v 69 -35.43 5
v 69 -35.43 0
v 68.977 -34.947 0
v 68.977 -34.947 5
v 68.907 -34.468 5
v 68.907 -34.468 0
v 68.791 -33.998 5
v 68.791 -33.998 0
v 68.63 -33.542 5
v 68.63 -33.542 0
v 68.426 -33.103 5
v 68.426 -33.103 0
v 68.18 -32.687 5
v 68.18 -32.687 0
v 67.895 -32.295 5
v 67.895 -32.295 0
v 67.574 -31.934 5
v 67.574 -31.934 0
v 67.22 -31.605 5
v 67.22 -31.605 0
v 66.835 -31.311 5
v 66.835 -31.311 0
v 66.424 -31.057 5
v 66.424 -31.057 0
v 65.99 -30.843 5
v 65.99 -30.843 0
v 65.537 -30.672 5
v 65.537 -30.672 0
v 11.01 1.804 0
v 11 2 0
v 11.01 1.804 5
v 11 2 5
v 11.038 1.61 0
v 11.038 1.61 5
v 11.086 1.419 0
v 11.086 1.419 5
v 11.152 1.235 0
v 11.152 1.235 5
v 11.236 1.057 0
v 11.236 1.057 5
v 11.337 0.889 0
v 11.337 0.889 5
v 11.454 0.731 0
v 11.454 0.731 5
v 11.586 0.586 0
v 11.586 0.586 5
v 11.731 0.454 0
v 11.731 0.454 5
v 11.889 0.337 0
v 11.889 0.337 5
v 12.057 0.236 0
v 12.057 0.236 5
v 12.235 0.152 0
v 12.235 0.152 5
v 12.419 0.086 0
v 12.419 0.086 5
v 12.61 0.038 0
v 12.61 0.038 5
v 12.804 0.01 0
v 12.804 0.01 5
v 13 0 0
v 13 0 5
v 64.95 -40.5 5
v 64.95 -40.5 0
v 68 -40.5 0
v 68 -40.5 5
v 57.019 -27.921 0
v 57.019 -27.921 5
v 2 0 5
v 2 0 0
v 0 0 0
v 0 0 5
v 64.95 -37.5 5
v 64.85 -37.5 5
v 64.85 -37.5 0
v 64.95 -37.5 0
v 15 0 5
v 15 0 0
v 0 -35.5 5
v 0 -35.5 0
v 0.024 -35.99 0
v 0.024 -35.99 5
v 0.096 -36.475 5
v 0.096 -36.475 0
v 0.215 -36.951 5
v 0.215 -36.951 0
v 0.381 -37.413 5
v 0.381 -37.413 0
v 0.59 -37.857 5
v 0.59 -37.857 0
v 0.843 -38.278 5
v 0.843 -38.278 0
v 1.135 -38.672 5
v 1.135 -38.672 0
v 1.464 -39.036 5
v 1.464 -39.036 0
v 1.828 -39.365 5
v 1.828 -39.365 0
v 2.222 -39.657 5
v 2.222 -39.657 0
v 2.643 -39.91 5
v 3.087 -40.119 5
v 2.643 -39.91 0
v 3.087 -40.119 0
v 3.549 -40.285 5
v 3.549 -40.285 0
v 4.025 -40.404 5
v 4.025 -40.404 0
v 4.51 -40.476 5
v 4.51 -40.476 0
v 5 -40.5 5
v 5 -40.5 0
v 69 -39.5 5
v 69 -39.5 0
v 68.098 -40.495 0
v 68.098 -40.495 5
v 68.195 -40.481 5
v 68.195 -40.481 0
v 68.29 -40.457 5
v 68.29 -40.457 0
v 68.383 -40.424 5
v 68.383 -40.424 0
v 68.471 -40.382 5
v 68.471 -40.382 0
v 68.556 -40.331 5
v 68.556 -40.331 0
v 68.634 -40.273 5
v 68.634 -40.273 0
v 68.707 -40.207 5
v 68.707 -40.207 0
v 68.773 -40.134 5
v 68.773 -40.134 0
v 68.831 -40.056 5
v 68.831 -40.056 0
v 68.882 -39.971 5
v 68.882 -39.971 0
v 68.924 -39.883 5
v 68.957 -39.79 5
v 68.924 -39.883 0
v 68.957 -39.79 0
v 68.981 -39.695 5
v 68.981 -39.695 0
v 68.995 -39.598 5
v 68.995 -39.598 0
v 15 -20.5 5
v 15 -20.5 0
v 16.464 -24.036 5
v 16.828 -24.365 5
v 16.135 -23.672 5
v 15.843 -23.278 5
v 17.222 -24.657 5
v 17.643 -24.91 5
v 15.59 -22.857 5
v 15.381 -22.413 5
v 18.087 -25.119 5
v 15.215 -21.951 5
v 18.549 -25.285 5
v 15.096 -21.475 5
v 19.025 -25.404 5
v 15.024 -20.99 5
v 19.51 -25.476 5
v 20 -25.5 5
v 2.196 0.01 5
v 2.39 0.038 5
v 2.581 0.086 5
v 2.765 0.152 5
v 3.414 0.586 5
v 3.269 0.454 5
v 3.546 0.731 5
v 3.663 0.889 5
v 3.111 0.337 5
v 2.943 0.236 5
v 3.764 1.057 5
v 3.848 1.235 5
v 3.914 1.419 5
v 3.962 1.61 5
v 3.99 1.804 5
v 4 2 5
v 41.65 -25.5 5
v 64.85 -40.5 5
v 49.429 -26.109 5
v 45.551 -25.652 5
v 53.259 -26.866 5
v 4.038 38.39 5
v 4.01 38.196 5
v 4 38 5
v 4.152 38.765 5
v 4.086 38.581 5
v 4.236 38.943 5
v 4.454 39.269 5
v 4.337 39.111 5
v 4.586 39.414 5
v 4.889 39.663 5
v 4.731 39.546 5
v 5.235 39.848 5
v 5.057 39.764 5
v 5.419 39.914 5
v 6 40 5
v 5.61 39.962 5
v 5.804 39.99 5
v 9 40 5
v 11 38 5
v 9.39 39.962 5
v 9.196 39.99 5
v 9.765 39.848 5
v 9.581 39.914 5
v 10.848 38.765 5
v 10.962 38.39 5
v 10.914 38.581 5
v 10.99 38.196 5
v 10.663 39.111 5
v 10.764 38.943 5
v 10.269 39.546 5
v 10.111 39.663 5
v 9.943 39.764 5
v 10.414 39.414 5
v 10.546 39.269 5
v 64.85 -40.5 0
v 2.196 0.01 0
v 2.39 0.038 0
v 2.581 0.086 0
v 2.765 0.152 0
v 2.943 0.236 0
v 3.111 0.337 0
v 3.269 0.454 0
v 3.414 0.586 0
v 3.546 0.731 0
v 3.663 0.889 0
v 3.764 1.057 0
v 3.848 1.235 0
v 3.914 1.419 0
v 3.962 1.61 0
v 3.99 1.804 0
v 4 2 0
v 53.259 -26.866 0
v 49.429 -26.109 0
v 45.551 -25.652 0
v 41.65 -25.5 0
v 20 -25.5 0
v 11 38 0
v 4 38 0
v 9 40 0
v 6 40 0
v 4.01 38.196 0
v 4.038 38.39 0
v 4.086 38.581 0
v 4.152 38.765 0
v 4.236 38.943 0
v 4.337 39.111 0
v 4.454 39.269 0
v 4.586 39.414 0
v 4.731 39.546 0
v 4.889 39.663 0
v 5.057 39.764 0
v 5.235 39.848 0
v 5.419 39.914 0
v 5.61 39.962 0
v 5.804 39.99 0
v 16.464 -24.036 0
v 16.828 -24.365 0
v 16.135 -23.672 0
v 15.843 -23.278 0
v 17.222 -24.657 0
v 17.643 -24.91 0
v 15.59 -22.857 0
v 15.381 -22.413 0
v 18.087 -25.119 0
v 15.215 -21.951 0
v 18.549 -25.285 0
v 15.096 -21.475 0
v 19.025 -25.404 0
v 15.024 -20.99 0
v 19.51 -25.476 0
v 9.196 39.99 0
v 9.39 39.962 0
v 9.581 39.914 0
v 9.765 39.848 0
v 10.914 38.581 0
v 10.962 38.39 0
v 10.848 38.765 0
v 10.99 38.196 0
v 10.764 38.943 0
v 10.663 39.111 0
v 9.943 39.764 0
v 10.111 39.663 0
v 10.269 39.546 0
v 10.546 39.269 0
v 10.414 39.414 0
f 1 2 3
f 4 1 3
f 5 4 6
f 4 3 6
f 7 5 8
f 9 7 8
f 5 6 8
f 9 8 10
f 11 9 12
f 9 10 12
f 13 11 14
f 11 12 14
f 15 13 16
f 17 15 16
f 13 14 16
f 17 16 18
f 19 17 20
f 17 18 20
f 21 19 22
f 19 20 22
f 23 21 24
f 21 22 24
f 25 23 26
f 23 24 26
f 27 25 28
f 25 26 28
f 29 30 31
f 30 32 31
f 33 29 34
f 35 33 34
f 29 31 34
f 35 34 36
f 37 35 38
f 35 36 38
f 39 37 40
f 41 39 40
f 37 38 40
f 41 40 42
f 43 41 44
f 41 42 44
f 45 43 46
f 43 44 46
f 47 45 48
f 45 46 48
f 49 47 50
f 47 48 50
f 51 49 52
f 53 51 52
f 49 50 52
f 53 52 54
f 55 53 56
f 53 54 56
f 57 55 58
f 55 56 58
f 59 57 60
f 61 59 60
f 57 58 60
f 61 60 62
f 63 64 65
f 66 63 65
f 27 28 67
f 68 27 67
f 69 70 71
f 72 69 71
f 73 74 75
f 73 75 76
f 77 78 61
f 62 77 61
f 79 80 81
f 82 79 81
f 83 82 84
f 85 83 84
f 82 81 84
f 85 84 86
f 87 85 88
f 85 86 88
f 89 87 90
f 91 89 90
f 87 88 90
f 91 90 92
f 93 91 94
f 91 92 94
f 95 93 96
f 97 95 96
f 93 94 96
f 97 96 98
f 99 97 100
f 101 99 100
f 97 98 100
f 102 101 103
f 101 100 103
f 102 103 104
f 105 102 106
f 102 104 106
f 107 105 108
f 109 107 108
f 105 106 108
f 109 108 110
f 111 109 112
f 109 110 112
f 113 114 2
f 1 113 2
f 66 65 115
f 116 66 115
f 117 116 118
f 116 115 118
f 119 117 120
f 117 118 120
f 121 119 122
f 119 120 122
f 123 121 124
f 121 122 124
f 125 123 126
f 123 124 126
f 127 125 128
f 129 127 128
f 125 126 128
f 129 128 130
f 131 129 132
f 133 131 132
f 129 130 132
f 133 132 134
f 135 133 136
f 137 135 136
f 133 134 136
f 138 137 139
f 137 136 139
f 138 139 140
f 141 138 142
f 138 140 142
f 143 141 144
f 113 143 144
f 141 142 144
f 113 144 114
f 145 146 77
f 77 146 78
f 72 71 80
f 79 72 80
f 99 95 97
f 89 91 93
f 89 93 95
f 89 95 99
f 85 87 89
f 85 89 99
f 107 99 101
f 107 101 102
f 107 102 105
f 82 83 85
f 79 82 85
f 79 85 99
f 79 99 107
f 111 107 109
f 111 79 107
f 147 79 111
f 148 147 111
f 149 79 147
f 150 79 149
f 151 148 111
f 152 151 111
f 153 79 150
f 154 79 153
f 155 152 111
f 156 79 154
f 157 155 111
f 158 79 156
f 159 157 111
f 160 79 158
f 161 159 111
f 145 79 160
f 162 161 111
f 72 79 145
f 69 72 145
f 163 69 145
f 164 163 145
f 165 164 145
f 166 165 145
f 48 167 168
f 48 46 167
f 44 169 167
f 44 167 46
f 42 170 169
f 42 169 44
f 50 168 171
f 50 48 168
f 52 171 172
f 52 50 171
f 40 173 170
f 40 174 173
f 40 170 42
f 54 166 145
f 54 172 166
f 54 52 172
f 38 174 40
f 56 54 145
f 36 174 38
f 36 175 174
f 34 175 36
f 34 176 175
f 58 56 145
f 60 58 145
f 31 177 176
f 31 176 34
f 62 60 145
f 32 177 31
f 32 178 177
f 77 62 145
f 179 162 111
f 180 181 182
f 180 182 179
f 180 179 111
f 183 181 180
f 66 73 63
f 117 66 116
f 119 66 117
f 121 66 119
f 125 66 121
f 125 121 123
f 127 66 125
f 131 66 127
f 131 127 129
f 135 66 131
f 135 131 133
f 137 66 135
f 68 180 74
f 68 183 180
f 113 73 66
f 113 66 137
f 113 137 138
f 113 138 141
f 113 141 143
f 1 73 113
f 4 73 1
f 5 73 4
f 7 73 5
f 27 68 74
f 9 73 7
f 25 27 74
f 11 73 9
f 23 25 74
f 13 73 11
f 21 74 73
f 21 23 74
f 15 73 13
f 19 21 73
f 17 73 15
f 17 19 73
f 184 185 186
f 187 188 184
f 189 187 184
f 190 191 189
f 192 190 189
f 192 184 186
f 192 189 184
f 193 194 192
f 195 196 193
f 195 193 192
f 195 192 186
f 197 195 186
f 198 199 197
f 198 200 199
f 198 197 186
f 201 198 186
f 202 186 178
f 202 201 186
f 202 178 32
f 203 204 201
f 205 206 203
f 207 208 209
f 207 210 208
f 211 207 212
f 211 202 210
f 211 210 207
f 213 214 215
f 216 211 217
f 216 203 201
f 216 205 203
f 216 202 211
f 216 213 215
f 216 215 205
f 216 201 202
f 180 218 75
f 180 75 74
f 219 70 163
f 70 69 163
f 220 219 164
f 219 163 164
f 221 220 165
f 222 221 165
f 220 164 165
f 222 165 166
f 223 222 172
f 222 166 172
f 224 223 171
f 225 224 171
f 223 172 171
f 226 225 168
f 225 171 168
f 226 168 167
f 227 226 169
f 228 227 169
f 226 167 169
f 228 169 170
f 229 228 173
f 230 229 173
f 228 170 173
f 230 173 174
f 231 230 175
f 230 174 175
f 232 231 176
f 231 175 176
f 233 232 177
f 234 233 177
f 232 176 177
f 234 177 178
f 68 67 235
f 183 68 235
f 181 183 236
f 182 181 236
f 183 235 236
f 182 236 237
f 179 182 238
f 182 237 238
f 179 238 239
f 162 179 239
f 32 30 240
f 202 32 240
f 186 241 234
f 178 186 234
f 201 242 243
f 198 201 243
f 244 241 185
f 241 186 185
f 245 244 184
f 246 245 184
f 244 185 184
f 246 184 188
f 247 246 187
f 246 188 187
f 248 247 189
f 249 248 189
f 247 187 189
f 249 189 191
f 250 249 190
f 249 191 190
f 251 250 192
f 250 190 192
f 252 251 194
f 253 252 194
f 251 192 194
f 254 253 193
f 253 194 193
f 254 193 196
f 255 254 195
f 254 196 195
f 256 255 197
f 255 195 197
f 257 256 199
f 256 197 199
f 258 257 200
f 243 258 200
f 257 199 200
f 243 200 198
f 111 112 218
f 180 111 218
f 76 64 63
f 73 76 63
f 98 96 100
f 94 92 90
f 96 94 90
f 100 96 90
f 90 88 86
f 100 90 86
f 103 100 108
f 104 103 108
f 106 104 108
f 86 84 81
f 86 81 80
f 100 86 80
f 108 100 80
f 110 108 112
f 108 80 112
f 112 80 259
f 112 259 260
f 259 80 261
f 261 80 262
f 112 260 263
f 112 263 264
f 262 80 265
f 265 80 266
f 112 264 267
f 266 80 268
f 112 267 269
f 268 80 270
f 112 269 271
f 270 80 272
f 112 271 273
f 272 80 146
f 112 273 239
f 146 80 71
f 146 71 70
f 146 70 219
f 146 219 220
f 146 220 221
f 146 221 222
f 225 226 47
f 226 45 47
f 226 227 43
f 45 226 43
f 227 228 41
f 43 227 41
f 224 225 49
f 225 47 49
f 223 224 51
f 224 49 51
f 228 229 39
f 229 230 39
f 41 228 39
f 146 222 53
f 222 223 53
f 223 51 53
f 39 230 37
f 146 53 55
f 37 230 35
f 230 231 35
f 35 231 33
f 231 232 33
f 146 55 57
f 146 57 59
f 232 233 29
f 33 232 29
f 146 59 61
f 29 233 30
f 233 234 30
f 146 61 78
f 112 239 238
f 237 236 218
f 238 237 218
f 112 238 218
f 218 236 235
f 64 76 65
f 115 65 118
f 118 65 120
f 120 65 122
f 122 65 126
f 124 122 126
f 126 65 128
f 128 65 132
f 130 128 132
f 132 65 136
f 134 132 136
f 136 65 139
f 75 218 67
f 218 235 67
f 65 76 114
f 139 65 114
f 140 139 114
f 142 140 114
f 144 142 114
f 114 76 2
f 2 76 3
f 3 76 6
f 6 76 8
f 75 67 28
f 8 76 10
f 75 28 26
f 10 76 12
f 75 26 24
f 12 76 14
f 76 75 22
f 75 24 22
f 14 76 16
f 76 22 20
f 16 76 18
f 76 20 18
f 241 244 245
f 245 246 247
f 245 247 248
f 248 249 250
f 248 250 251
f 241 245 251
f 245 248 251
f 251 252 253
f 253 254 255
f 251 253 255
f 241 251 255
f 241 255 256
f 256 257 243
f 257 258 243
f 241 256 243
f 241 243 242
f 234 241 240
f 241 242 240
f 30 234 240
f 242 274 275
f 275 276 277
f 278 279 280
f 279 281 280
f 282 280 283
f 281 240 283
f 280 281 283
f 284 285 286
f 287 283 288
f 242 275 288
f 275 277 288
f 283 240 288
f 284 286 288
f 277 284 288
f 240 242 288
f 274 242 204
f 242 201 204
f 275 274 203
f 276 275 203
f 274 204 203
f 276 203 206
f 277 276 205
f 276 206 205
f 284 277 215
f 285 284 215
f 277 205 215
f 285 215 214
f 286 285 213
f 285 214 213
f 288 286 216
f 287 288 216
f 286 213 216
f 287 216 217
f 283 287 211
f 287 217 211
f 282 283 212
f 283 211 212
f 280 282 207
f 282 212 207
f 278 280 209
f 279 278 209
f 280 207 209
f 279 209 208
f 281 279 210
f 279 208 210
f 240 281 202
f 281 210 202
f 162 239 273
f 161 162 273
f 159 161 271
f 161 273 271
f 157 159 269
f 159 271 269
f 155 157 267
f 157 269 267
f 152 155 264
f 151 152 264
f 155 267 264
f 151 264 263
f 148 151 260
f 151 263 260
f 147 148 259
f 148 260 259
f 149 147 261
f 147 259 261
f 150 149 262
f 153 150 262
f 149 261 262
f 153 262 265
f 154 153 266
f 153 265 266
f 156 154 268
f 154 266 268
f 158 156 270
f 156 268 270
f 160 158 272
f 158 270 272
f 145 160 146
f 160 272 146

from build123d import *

# Parameters (mm, degrees)
BOSS_EXTRUDE1_DEPTH = 5
SKETCH2_W           = 0.1
SKETCH2_H           = 5
CUT_EXTRUDE2_DEPTH  = 3
FILLET1_R           = 2


with BuildPart() as part:
    # Sketch1 → Boss-Extrude1 (new body)
    with BuildSketch(Plane.XY):
        with BuildLine():
            Line((0, -1), (0, -35.5))
            ThreePointArc((0, -35.5), (1.464466094, -39.035533906), (5, -40.5))
            Line((5, -40.5), (68, -40.5))
            ThreePointArc((68, -40.5), (68.707106781, -40.207106781), (69, -39.5))
            Line((69, -39.5), (69, -35.429996046))
            ThreePointArc((69, -35.429996046), (68.042547906, -32.487580979), (65.53687743, -30.672054499))
            Line((65.53687743, -30.672054499), (57.01873992, -27.920584529))
            ThreePointArc((57.01873992, -27.920584529), (49.429079532, -26.108853154), (41.649965621, -25.5))
            Line((41.649965621, -25.5), (20, -25.5))
            ThreePointArc((20, -25.5), (16.464466094, -24.035533906), (15, -20.5))
            Line((15, -20.5), (15, -1))
            Line((15, -1), (15, 0))
            Line((15, 0), (14, 0))
            Line((14, 0), (11, 0))
            Line((11, 0), (11, 40))
            Line((11, 40), (4, 40))
            Line((4, 40), (4, 0))
            Line((4, 0), (1, 0))
            Line((1, 0), (0, 0))
            Line((0, 0), (0, -1))
        make_face()
    extrude(amount=BOSS_EXTRUDE1_DEPTH)

    # Sketch2 → Cut-Extrude2 (cut)
    with BuildSketch(Plane.XZ.offset(40.5)):
        with Locations((64.9, 2.5)):
            Rectangle(SKETCH2_W, SKETCH2_H)
    extrude(amount=-CUT_EXTRUDE2_DEPTH, mode=Mode.SUBTRACT)

    # Fillet1
    fillet1_edges = [part.edges().sort_by_distance(p)[0] for p in [
        (4, 0, 2.5),
        (4, 40, 2.5),
        (11, 40, 2.5),
        (11, 0, 2.5),
    ]]
    fillet(fillet1_edges, radius=FILLET1_R)


solid = part.part
